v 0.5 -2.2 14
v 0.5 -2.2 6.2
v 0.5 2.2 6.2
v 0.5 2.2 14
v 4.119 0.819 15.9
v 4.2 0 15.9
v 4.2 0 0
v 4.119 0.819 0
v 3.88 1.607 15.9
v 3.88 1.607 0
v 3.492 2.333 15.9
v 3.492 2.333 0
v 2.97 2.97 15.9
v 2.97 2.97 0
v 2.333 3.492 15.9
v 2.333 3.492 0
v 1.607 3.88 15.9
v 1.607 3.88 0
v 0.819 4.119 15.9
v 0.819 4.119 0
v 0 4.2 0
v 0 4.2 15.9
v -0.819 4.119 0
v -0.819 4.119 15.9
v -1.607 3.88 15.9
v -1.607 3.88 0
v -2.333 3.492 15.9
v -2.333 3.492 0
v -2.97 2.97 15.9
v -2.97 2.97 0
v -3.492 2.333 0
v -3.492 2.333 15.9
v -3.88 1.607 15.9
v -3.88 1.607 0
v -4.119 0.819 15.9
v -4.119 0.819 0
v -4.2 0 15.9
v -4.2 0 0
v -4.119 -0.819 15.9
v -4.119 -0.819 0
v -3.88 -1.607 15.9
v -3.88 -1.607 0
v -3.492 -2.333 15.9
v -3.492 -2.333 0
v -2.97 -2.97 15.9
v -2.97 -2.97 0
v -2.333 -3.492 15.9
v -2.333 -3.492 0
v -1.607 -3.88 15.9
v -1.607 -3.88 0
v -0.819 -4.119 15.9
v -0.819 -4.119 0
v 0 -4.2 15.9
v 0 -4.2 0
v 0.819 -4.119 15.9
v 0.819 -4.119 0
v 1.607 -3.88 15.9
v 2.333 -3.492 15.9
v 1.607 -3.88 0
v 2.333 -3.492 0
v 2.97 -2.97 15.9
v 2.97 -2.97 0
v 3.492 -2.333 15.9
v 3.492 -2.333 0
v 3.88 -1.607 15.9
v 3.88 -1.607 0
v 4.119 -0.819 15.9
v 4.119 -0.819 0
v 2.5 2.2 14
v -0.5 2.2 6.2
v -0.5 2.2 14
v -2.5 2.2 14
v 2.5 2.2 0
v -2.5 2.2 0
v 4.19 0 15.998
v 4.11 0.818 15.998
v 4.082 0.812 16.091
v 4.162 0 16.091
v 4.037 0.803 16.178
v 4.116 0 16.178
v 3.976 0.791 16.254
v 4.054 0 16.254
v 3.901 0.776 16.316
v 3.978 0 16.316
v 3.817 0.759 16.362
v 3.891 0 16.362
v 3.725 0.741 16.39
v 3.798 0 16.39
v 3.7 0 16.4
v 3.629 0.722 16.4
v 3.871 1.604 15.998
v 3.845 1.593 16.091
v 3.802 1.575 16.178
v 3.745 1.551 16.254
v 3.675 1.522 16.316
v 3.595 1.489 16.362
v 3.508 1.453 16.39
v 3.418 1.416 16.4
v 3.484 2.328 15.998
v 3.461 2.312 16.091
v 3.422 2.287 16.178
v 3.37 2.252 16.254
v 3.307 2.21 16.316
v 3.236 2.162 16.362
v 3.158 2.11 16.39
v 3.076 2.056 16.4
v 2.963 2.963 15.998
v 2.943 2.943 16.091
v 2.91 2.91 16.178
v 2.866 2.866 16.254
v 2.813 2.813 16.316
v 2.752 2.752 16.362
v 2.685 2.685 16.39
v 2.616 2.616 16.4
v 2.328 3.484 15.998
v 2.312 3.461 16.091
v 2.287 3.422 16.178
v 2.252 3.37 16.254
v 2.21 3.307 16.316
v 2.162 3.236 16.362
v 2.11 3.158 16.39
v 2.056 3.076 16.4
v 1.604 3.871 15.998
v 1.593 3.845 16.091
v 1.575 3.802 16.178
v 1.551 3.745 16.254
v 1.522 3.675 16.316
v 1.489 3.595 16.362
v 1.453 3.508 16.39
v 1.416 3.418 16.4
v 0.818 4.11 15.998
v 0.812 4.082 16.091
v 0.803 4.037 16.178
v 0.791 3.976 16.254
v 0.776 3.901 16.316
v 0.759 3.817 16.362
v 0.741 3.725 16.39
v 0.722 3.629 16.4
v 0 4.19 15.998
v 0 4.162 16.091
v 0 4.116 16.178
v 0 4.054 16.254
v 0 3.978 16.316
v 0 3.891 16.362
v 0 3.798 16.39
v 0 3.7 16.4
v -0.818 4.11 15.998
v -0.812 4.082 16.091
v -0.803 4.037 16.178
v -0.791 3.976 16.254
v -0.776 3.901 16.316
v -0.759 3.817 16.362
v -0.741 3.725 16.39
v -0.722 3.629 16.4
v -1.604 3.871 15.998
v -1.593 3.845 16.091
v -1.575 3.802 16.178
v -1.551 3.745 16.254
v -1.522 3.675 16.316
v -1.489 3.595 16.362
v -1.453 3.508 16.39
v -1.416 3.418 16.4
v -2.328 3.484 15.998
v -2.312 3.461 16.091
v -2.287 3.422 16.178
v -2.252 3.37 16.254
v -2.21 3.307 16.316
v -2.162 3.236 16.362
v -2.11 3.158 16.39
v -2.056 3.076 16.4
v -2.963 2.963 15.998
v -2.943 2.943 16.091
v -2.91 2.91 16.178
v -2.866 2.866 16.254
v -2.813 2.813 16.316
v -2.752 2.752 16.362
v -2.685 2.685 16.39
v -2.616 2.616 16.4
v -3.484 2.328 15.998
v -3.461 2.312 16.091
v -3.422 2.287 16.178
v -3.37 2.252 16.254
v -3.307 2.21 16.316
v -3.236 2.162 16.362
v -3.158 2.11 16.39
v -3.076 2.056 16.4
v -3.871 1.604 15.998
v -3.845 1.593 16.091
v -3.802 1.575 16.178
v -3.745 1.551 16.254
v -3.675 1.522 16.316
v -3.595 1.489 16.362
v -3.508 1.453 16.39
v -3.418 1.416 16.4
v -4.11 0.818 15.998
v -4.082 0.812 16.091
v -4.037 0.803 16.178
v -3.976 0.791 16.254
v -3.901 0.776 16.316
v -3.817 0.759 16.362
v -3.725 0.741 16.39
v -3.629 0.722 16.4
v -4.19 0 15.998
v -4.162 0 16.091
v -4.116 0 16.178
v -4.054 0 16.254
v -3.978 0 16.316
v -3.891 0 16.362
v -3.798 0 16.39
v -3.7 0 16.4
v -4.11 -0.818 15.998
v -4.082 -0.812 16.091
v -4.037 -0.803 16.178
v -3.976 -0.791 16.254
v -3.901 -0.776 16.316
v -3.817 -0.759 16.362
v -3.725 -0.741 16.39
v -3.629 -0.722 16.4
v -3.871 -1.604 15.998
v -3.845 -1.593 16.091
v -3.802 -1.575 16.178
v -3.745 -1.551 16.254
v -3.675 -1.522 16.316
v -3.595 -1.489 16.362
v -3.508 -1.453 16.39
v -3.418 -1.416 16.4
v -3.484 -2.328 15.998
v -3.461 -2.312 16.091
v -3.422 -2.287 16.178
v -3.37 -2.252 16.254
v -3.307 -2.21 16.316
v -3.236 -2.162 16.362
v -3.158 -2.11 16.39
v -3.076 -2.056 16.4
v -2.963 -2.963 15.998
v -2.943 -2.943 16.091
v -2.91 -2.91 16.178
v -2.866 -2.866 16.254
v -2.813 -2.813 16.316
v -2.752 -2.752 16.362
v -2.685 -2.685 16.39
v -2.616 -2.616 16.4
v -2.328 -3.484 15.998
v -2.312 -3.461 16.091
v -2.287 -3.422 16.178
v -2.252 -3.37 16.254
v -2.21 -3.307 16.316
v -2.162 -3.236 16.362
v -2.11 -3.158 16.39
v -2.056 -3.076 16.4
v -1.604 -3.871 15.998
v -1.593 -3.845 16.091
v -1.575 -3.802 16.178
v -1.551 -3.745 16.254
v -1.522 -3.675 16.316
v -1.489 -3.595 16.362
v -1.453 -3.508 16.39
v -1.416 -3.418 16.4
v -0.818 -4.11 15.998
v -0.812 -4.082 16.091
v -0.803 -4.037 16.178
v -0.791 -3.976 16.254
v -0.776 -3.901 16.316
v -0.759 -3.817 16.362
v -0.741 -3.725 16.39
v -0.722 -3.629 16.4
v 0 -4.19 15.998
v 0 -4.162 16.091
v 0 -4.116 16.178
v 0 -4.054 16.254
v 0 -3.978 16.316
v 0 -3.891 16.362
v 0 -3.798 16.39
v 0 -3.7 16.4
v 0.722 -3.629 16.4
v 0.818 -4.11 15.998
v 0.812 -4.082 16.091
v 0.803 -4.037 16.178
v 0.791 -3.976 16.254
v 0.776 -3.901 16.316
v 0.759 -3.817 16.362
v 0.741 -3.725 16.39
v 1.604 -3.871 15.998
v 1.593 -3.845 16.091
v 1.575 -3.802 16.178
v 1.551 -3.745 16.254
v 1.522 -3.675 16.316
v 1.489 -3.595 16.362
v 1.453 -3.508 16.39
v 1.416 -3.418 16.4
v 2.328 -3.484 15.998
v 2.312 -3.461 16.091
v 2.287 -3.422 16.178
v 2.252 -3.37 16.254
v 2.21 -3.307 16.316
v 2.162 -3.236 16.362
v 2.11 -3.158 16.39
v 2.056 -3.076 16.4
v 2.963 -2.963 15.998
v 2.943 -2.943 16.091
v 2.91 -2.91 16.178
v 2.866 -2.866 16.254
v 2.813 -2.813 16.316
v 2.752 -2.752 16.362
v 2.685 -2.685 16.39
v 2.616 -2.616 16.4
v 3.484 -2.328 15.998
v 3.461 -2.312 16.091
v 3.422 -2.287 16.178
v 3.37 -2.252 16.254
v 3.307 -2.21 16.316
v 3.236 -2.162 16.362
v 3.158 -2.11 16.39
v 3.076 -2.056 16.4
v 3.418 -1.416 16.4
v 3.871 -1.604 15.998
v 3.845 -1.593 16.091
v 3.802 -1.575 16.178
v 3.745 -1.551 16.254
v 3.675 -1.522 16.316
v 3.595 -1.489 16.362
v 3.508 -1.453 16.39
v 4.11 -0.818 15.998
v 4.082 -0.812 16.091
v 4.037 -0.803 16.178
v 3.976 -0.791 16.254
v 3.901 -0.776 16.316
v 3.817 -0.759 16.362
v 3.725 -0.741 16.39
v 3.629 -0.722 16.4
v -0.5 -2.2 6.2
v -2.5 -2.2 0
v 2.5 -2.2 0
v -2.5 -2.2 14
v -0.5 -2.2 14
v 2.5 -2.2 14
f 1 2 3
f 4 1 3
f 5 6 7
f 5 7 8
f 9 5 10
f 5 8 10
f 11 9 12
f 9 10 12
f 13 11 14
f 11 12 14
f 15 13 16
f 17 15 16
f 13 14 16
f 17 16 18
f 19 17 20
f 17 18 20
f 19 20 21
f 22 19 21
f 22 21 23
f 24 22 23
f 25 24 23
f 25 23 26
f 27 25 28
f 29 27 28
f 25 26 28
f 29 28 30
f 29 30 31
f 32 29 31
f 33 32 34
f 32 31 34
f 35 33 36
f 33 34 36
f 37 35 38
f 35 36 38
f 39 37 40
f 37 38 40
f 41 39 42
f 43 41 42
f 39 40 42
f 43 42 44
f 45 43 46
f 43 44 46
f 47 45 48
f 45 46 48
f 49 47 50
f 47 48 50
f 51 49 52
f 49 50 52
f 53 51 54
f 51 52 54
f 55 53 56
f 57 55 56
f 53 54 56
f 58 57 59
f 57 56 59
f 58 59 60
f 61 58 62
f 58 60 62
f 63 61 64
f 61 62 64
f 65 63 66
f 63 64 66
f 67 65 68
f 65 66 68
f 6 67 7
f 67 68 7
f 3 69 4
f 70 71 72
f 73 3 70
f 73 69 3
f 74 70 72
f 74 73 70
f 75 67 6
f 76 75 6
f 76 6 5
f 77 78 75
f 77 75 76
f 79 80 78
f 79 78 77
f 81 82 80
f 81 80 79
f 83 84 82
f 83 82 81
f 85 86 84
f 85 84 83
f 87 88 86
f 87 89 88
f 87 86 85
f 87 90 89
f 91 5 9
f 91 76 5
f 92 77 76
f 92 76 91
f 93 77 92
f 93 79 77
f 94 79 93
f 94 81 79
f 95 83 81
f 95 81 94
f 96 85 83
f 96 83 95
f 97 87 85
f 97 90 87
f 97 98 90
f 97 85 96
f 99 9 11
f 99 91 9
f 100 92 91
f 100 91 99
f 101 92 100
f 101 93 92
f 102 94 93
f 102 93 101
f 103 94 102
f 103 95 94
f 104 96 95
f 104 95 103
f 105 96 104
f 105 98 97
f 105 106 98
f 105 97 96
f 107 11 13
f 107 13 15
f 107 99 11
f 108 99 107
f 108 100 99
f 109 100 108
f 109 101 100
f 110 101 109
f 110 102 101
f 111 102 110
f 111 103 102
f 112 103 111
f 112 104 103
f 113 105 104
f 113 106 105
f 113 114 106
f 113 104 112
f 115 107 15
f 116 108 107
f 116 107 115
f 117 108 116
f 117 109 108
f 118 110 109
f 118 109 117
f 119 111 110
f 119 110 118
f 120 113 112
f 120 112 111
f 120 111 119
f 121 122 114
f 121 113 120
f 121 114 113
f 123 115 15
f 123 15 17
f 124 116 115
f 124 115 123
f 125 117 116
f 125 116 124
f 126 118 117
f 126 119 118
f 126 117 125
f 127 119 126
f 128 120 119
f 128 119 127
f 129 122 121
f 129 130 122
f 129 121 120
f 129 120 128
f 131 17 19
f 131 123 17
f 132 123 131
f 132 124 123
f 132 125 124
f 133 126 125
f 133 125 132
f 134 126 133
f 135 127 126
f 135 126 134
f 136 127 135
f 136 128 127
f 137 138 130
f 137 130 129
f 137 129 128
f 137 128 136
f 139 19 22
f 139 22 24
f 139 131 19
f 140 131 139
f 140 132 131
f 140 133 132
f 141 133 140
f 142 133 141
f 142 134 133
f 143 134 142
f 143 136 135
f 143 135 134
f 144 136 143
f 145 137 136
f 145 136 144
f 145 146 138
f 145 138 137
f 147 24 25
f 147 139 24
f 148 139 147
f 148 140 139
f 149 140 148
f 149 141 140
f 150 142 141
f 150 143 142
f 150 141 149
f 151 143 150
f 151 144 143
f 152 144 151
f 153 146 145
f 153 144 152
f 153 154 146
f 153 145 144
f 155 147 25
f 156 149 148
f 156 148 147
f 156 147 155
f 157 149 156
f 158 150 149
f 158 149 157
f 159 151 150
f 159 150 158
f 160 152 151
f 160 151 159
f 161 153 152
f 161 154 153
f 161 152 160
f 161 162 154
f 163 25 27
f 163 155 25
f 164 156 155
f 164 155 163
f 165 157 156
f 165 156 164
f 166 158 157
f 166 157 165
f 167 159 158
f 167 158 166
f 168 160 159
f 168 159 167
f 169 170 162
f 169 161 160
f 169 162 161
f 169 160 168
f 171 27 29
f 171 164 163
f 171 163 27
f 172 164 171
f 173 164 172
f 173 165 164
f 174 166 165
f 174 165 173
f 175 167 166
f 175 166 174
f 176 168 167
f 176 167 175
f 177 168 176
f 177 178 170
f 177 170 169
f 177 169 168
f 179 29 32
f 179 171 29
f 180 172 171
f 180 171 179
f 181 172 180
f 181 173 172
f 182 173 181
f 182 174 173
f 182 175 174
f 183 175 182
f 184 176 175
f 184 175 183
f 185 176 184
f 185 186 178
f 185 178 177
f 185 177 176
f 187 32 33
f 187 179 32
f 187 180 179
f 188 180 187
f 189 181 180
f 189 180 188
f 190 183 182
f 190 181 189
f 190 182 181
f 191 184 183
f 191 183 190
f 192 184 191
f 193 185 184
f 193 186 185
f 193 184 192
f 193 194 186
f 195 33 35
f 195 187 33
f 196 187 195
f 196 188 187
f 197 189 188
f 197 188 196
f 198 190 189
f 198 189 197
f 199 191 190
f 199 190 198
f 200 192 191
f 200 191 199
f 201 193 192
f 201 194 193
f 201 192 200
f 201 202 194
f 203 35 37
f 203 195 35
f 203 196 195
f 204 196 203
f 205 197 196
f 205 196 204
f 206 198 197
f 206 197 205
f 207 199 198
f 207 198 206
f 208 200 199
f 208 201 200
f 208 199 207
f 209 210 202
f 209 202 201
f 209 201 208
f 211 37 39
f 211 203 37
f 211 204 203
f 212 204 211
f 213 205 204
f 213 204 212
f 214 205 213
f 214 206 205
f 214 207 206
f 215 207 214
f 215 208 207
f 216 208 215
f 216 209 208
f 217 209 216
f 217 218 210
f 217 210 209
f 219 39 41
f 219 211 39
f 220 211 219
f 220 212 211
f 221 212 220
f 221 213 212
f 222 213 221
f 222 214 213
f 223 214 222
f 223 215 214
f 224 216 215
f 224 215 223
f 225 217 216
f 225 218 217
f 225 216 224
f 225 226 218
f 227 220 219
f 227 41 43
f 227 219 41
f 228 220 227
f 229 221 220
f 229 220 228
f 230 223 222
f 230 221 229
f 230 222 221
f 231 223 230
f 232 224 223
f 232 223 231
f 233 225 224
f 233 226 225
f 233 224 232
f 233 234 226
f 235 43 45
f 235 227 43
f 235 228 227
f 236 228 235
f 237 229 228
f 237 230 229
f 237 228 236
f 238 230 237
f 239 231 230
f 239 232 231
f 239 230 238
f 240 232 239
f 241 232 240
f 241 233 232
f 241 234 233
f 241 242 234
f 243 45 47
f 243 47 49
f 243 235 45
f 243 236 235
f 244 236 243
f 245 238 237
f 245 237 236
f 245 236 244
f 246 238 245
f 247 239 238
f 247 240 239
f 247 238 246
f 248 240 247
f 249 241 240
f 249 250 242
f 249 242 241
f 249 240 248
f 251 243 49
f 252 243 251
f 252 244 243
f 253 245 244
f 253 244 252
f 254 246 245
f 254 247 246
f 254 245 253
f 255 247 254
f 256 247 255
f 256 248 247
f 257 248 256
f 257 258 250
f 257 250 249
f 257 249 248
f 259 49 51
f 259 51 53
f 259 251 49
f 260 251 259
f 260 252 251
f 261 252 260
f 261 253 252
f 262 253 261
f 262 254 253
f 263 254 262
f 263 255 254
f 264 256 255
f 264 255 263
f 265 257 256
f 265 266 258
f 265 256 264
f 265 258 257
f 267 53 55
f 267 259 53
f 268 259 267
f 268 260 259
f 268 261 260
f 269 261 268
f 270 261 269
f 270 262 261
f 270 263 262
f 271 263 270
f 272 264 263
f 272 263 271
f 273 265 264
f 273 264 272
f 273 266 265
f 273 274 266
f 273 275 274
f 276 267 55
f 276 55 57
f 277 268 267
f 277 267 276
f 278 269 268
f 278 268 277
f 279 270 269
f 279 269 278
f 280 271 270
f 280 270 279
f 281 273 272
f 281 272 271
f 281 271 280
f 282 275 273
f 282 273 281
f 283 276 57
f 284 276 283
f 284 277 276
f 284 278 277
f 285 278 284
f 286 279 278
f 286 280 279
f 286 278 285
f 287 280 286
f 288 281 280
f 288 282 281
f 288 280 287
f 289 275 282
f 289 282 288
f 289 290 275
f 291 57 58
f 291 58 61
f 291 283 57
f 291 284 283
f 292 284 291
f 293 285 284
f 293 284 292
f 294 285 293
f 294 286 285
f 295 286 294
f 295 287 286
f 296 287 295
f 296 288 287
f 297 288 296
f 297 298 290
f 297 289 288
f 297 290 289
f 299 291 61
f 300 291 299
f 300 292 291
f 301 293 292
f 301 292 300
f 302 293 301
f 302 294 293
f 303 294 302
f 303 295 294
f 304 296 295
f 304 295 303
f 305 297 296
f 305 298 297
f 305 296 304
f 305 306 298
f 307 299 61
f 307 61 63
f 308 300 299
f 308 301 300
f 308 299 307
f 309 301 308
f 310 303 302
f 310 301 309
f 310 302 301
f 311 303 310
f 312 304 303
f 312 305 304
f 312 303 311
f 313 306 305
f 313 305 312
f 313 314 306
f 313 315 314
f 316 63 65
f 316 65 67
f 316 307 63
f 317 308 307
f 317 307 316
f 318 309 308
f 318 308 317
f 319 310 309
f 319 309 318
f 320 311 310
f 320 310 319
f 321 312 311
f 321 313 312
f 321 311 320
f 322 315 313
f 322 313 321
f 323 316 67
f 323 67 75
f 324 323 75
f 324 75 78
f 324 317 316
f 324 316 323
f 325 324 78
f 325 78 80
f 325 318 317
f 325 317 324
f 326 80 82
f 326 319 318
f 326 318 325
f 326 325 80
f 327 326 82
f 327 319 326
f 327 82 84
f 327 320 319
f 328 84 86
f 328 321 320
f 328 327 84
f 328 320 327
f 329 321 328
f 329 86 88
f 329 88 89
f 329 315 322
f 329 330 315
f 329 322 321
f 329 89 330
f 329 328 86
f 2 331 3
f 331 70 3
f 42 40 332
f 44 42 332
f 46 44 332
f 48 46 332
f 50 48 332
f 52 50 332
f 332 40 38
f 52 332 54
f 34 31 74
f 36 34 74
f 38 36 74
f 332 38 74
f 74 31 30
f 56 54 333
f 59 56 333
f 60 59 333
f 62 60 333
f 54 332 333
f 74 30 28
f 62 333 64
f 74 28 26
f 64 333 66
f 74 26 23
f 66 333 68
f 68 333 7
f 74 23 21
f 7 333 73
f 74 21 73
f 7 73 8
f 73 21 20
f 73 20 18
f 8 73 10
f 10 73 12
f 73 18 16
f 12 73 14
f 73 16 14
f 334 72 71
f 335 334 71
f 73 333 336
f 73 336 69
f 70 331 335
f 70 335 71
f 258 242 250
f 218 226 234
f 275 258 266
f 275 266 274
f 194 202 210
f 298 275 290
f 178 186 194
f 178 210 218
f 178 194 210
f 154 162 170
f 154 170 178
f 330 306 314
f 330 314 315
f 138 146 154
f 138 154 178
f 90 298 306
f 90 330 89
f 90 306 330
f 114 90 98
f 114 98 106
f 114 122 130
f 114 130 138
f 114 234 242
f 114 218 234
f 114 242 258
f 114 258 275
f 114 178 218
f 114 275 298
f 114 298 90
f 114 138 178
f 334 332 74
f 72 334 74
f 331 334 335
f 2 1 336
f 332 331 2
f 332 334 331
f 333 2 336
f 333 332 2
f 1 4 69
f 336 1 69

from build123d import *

# Parameters (mm, degrees)
F0_R     = 4.2
F0_W     = 2
F0_H     = 4.4
F0_W_2   = 1
F1_DEPTH = 16.4
F2_DEPTH = 6.2
F3_DEPTH = 14
F4_R     = 0.5


with BuildPart() as f1:
    # F0 (on Top) → F1 (new body)
    with BuildSketch(Plane.XY):
        Circle(F0_R)
        Polygon((-2.5, -2.2), (-2.5, 2.2), (-0.5, 2.2), (0.5, 2.2), (2.5, 2.2), (2.5, -2.2), (0.5, -2.2), (-0.5, -2.2), align=None, mode=Mode.SUBTRACT)
        with Locations((-1.5, 0)):
            Rectangle(F0_W, F0_H)
        with Locations((1.5, 0)):
            Rectangle(F0_W, F0_H)
        Rectangle(F0_W_2, F0_H)
    extrude(amount=F1_DEPTH)

    # F0 (on Top) → F2 (cut)
    with BuildSketch(Plane.XY):
        with Locations((1.5, 0)):
            Rectangle(F0_W, F0_H)
        with Locations((-1.5, 0)):
            Rectangle(F0_W, F0_H)
        Rectangle(F0_W_2, F0_H)
    extrude(amount=F2_DEPTH, mode=Mode.SUBTRACT)

    # F0 (on Top) → F3 (cut)
    with BuildSketch(Plane.XY):
        with Locations((1.5, 0)):
            Rectangle(F0_W, F0_H)
        with Locations((-1.5, 0)):
            Rectangle(F0_W, F0_H)
    extrude(amount=F3_DEPTH, mode=Mode.SUBTRACT)

    # F4
    f4_edges = [f1.edges().sort_by_distance(p)[0] for p in [
        (-4.2, 0, 16.4),
    ]]
    fillet(f4_edges, radius=F4_R)


solid = f1.part
